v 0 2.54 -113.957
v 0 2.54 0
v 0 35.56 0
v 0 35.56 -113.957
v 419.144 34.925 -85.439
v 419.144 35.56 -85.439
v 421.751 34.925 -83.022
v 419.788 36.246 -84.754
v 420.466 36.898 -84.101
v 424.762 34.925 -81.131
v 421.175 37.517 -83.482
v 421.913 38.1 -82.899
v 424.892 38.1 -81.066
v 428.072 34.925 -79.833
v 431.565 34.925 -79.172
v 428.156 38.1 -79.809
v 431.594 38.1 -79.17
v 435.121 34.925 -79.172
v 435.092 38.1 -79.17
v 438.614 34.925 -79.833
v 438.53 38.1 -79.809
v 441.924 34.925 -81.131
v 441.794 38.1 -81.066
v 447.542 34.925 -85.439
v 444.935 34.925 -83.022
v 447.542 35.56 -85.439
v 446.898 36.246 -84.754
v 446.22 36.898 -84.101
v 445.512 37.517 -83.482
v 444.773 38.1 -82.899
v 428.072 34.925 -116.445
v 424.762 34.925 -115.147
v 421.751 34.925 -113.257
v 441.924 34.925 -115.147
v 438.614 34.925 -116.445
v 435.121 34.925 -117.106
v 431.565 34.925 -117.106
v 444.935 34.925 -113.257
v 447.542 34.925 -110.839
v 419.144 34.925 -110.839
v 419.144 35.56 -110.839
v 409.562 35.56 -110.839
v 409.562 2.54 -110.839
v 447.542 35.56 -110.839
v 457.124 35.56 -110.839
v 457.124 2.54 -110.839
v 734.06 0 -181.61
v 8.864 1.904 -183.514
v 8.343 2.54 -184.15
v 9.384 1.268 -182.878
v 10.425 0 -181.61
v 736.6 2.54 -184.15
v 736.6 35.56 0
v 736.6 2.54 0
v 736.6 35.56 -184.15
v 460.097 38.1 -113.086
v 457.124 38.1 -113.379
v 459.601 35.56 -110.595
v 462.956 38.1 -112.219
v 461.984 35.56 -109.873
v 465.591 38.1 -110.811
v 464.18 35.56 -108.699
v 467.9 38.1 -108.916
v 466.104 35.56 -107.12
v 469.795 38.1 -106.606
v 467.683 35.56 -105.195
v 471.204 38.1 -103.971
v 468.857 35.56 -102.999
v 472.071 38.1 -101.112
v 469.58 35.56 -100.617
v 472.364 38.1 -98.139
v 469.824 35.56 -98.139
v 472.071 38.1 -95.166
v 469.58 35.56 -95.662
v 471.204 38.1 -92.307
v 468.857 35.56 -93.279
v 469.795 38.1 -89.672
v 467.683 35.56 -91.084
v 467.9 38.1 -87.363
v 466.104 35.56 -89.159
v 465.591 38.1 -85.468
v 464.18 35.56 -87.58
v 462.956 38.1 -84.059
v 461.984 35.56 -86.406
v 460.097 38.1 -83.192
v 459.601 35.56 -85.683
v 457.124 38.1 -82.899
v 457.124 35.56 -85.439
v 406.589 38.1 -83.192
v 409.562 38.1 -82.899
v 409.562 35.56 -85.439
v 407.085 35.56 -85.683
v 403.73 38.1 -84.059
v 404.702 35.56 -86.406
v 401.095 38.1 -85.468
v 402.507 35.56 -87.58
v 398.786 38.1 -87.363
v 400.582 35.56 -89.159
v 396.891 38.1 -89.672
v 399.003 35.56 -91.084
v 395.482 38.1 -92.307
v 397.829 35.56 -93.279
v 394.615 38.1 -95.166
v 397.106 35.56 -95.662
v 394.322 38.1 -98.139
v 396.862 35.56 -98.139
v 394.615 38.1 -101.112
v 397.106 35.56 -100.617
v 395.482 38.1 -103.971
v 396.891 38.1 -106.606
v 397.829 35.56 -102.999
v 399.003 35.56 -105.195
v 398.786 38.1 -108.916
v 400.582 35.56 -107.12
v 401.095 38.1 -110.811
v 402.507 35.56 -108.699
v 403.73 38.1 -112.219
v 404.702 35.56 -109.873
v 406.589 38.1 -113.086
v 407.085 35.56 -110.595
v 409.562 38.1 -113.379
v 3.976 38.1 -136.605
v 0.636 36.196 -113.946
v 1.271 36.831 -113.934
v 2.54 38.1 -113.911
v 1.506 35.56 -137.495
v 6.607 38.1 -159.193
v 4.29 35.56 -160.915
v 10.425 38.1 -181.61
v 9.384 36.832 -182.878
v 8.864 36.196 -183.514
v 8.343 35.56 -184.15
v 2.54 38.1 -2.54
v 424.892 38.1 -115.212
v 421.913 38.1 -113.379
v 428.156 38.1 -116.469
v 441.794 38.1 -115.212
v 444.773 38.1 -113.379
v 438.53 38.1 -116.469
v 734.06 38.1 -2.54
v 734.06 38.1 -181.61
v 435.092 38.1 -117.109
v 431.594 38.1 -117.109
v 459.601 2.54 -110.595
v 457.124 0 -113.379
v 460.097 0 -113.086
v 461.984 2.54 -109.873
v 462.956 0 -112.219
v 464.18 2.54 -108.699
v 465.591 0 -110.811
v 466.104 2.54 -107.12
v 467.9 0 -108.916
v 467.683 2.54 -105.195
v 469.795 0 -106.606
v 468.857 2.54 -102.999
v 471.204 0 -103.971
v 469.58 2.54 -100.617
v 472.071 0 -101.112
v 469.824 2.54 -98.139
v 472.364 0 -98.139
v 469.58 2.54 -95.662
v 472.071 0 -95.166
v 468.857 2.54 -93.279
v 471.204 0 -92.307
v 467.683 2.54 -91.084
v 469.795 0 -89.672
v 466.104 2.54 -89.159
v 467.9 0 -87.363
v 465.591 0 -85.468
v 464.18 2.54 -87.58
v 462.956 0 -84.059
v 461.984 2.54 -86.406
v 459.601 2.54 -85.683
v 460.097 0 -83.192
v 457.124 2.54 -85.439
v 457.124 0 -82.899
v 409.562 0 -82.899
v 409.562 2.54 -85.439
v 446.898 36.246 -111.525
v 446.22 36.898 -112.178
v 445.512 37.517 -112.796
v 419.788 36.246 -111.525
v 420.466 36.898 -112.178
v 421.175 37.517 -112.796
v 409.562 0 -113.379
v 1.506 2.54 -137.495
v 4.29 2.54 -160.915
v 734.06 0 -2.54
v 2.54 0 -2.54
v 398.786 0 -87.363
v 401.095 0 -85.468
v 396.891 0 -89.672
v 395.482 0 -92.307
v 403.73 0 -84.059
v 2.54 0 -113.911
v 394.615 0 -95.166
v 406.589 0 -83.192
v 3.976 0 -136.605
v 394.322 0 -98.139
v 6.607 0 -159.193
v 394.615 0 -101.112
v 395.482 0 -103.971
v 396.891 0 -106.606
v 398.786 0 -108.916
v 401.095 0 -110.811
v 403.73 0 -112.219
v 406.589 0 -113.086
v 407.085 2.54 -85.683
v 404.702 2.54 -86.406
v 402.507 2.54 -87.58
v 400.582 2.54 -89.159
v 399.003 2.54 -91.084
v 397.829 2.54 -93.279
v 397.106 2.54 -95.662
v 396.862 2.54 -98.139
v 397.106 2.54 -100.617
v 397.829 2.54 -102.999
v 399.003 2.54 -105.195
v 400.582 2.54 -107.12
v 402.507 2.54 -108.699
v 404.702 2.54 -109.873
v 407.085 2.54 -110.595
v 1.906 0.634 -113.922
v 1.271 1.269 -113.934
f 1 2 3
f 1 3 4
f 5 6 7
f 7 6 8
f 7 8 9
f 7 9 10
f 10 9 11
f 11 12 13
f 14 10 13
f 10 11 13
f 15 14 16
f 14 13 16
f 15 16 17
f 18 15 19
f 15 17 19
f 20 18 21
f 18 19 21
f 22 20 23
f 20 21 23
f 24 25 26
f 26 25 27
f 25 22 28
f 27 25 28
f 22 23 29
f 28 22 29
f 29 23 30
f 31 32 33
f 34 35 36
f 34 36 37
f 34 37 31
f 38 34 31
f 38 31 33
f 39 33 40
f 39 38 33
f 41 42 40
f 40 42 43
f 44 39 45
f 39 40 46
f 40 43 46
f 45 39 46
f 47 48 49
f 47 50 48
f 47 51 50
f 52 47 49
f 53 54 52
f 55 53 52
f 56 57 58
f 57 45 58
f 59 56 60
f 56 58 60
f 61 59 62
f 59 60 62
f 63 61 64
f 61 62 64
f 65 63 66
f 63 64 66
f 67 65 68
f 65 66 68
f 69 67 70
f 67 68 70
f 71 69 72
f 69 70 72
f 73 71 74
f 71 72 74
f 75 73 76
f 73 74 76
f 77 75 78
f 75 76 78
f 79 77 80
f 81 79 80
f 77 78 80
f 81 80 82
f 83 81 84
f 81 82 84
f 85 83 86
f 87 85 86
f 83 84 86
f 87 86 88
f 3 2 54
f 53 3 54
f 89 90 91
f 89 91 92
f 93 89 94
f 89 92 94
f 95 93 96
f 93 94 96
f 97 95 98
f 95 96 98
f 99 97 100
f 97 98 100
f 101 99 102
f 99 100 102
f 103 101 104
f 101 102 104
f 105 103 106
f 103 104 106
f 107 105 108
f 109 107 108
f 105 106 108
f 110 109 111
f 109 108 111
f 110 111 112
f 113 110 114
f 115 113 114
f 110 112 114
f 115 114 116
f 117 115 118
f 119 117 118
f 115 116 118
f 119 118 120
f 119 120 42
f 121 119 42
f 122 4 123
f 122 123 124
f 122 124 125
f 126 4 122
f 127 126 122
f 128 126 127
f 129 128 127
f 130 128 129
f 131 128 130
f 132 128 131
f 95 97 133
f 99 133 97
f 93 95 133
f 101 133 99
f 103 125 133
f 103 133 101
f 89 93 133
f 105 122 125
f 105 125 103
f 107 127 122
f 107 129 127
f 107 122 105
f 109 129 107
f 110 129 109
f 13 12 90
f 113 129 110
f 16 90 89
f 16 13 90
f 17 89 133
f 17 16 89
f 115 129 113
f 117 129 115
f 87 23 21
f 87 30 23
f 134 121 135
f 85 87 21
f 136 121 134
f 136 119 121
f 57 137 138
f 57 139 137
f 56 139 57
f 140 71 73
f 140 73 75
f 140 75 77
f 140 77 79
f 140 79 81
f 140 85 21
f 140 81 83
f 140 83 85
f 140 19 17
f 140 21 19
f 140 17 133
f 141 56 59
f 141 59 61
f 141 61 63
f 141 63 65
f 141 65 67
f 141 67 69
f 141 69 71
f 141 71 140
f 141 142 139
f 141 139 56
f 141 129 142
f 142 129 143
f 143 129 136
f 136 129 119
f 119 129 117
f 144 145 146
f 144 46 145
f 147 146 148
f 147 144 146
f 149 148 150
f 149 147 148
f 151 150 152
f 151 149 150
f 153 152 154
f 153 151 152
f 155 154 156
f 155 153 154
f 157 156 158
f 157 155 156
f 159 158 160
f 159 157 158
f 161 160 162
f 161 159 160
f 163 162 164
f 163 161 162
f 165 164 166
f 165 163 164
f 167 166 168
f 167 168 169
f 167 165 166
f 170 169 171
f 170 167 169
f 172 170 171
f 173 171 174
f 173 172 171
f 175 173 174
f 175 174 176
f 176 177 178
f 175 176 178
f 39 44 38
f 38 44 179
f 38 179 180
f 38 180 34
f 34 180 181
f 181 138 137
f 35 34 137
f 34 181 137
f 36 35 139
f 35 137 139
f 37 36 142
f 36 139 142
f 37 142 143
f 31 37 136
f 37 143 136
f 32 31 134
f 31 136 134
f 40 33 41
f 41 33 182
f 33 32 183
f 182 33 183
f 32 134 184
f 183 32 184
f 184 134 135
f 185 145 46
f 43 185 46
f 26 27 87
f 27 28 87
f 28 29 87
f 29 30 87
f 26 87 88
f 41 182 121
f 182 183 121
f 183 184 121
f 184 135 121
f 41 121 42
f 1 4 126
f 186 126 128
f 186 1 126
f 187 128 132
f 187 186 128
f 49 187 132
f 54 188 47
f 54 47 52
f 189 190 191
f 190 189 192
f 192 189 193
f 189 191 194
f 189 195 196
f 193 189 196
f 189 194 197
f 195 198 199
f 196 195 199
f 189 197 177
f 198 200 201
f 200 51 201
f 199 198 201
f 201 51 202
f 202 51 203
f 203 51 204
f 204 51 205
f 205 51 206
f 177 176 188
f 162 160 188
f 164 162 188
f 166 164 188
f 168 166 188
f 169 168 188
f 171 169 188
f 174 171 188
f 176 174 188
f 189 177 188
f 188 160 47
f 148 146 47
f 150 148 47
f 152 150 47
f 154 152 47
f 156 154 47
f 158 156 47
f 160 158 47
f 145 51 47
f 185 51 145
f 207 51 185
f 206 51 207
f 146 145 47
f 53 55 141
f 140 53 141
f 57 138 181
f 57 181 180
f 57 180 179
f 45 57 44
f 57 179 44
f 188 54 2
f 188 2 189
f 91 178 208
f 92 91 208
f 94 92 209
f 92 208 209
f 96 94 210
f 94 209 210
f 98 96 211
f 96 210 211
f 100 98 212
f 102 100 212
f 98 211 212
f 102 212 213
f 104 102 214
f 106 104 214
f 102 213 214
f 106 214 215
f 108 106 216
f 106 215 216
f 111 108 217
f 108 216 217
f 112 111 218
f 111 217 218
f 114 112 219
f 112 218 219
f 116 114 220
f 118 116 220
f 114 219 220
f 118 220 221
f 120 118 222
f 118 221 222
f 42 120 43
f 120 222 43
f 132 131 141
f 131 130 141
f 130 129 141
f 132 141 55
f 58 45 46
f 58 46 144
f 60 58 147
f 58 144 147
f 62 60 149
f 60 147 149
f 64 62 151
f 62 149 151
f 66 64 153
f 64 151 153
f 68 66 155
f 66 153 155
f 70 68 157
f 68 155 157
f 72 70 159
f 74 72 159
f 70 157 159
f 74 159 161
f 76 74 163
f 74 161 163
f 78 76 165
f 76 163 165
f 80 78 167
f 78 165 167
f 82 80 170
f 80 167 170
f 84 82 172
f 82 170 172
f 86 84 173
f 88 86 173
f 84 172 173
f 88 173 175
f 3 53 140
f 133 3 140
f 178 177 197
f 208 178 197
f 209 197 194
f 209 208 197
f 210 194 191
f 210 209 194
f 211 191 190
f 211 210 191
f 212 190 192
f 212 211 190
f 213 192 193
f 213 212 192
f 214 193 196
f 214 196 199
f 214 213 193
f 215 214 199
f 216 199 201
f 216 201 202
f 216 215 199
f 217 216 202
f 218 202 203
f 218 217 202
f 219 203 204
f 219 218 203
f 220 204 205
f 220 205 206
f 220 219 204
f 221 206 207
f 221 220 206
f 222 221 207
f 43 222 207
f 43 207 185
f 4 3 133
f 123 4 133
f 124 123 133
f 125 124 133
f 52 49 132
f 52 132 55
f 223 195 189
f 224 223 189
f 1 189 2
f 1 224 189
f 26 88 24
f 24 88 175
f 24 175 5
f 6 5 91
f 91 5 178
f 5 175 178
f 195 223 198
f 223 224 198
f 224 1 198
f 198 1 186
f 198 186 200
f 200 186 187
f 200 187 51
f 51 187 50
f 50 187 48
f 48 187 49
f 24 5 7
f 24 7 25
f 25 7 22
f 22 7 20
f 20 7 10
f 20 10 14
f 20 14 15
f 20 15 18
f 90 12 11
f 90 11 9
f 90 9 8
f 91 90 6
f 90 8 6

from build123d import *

# Parameters (mm, degrees)
SKETCH1_W           = 736.6
SKETCH1_H           = 184.15
BOSS_EXTRUDE1_DEPTH = 38.1
CUT_EXTRUDE2_DEPTH  = 761.225224851
CHAMFER1_SIZE       = 2.54
CHAMFER2_SIZE       = 2.54
SKETCH2_R           = 19.05
CUT_EXTRUDE1_DEPTH  = 3.175


with BuildPart() as part:
    # Sketch1 → Boss-Extrude1 (new body)
    with BuildSketch(Plane(origin=(0, 0, 0), x_dir=(1, 0, 0), z_dir=(0, 1, 0))):
        with Locations((368.3, 92.075)):
            Rectangle(SKETCH1_W, SKETCH1_H)
        with BuildLine():
            Line((409.5623, 110.83925), (457.1238, 110.83925))
            ThreePointArc((457.1238, 110.83925), (469.8238, 98.13925), (457.1238, 85.43925))
            Line((457.1238, 85.43925), (409.5623, 85.43925))
            ThreePointArc((409.5623, 85.43925), (396.8623, 98.13925), (409.5623, 110.83925))
        make_face(mode=Mode.SUBTRACT)
    extrude(amount=BOSS_EXTRUDE1_DEPTH)

    # Sketch4 → Cut-Extrude2 (cut, through all)
    with BuildSketch(Plane.XZ):
        with BuildLine():
            Line((0, -184.15), (0, -113.957302712))
            ThreePointArc((0, -113.957302712), (2.738891811, -149.223945145), (8.343201677, -184.15))
            Line((8.343201677, -184.15), (0, -184.15))
        make_face()
    extrude(amount=-CUT_EXTRUDE2_DEPTH, mode=Mode.SUBTRACT)

    # Chamfer1
    # the kernel refuses this chamfer: 2.54 mm, written as the material it takes off along each edge
    with BuildSketch(Plane(origin=(736.6, 38.1, 6.532074789), x_dir=(0.027495876610568244, -0.9996219169112971, 0), z_dir=(0, 0, -1))) as chamfer1_piece_1:
        Polygon((CHAMFER1_SIZE * 0.999621916911, CHAMFER1_SIZE * 0.0274958766106), (-CHAMFER1_SIZE * 0.0274958766106, CHAMFER1_SIZE * 0.999621916911), (0, 0), align=None)
    extrude(amount=197.214149579, mode=Mode.SUBTRACT)
    with BuildSketch(Plane(origin=(457.1238, 38.1, -98.13925), x_dir=(0, 0, -1), z_dir=(-1, 0, 0))) as chamfer1_piece_2:
        Polygon((12.7 + CHAMFER1_SIZE, 0), (12.7, CHAMFER1_SIZE), (12.7, 0), align=None)
    revolve(axis=Axis((457.1238, 38.1, -98.13925), (0, -1, 0)), revolution_arc=180, mode=Mode.SUBTRACT)
    with BuildSketch(Plane(origin=(743.132074789, 38.1, -184.15), x_dir=(0, 0.027495876610587267, 0.9996219169112966), z_dir=(-1, 0, 0))) as chamfer1_piece_3:
        Polygon((CHAMFER1_SIZE * 0.999621916911, -CHAMFER1_SIZE * 0.0274958766106), (-CHAMFER1_SIZE * 0.0274958766106, -CHAMFER1_SIZE * 0.999621916911), (0, 0), align=None)
    extrude(amount=741.320947902, mode=Mode.SUBTRACT)
    with BuildSketch(Plane(origin=(409.5623, 38.1, -110.83925), x_dir=(0, 0.027495876610587267, -0.9996219169112966), z_dir=(1, 0, 0)), Plane(origin=(457.1238, 38.1, -85.43925), x_dir=(0, 0.027495876610587267, 0.9996219169112966), z_dir=(-1, 0, 0))) as chamfer1_piece_4:
        Polygon((CHAMFER1_SIZE * 0.999621916911, -CHAMFER1_SIZE * 0.0274958766106), (-CHAMFER1_SIZE * 0.0274958766106, -CHAMFER1_SIZE * 0.999621916911), (0, 0), align=None)
    extrude(amount=47.5615, mode=Mode.SUBTRACT)
    with BuildSketch(Plane(origin=(409.5623, 38.1, -98.13925), x_dir=(0, 0, 1), z_dir=(1, 0, 0))) as chamfer1_piece_5:
        Polygon((12.7 + CHAMFER1_SIZE, 0), (12.7, CHAMFER1_SIZE), (12.7, 0), align=None)
    revolve(axis=Axis((409.5623, 38.1, -98.13925), (0, -1, 0)), revolution_arc=180, mode=Mode.SUBTRACT)
    with BuildSketch(Plane(origin=(0, 38.1, -120.489377502), x_dir=(-0.02749587661058648, -0.9996219169112968, 0), z_dir=(0, 0, 1))) as chamfer1_piece_6:
        Polygon((CHAMFER1_SIZE * 0.999621916911, CHAMFER1_SIZE * 0.0274958766106), (-CHAMFER1_SIZE * 0.0274958766106, CHAMFER1_SIZE * 0.999621916911), (0, 0), align=None)
    extrude(amount=127.021452291, mode=Mode.SUBTRACT)
    with BuildSketch(Plane(origin=(433.324, 38.1, -98.044), x_dir=(-0.9997657983904642, 0, -0.021641357828885384), z_dir=(-0.021641357828885384, 0, 0.9997657983904642))) as chamfer1_piece_7:
        Polygon((433.6161 - CHAMFER1_SIZE, 0), (433.6161, CHAMFER1_SIZE), (433.6161, 0), align=None)
    revolve(axis=Axis((433.324, 38.1, -98.044), (0, -1, 0)), revolution_arc=11.076796252, mode=Mode.SUBTRACT)
    with BuildSketch(Plane(origin=(-6.532074789, 38.1, 0), x_dir=(0, -0.9996219169112968, 0.027495876610586393), z_dir=(1, 0, 0))) as chamfer1_piece_8:
        Polygon((CHAMFER1_SIZE * 0.999621916911, CHAMFER1_SIZE * 0.0274958766106), (-CHAMFER1_SIZE * 0.0274958766106, CHAMFER1_SIZE * 0.999621916911), (0, 0), align=None)
    extrude(amount=749.664149579, mode=Mode.SUBTRACT)

    # Chamfer2
    # the kernel refuses this chamfer: 2.54 mm, written as the material it takes off along each edge
    with BuildSketch(Plane(origin=(457.1238, 0, -98.13925), x_dir=(0, 0, -1), z_dir=(-1, 0, 0))) as chamfer2_piece_1:
        Polygon((12.7 + CHAMFER2_SIZE, 0), (12.7, -CHAMFER2_SIZE), (12.7, 0), align=None)
    revolve(axis=Axis((457.1238, 0, -98.13925), (0, -1, 0)), revolution_arc=180, mode=Mode.SUBTRACT)
    with BuildSketch(Plane(origin=(409.5623, 0, -110.83925), x_dir=(0, -0.027495876610586324, -0.9996219169112968), z_dir=(1, 0, 0)), Plane(origin=(457.1238, 0, -85.43925), x_dir=(0, -0.027495876610586324, 0.9996219169112968), z_dir=(-1, 0, 0))) as chamfer2_piece_2:
        Polygon((CHAMFER2_SIZE * 0.999621916911, CHAMFER2_SIZE * 0.0274958766106), (-CHAMFER2_SIZE * 0.0274958766106, CHAMFER2_SIZE * 0.999621916911), (0, 0), align=None)
    extrude(amount=47.5615, mode=Mode.SUBTRACT)
    with BuildSketch(Plane(origin=(409.5623, 0, -98.13925), x_dir=(0, 0, 1), z_dir=(1, 0, 0))) as chamfer2_piece_3:
        Polygon((12.7 + CHAMFER2_SIZE, 0), (12.7, -CHAMFER2_SIZE), (12.7, 0), align=None)
    revolve(axis=Axis((409.5623, 0, -98.13925), (0, -1, 0)), revolution_arc=180, mode=Mode.SUBTRACT)
    with BuildSketch(Plane(origin=(0, 0, -120.489377502), x_dir=(0.9996219169112968, -0.02749587661058605, 0), z_dir=(0, 0, 1))) as chamfer2_piece_4:
        Polygon((CHAMFER2_SIZE * 0.999621916911, CHAMFER2_SIZE * 0.0274958766106), (-CHAMFER2_SIZE * 0.0274958766106, CHAMFER2_SIZE * 0.999621916911), (0, 0), align=None)
    extrude(amount=127.021452291, mode=Mode.SUBTRACT)
    with BuildSketch(Plane(origin=(433.324, 0, -98.044), x_dir=(-0.9997657983904642, 0, -0.021641357828885415), z_dir=(-0.021641357828885415, 0, 0.9997657983904642))) as chamfer2_piece_5:
        Polygon((433.6161 - CHAMFER2_SIZE, 0), (433.6161, -CHAMFER2_SIZE), (433.6161, 0), align=None)
    revolve(axis=Axis((433.324, 0, -98.044), (0, -1, 0)), revolution_arc=11.076796252, mode=Mode.SUBTRACT)
    with BuildSketch(Plane(origin=(743.132074789, 0, -184.15), x_dir=(0, -0.027495876610586403, 0.9996219169112968), z_dir=(-1, 0, 0))) as chamfer2_piece_6:
        Polygon((CHAMFER2_SIZE * 0.999621916911, CHAMFER2_SIZE * 0.0274958766106), (-CHAMFER2_SIZE * 0.0274958766106, CHAMFER2_SIZE * 0.999621916911), (0, 0), align=None)
    extrude(amount=741.320947902, mode=Mode.SUBTRACT)
    with BuildSketch(Plane(origin=(736.6, 0, 6.532074789), x_dir=(-0.9996219169112966, -0.027495876610587444, 0), z_dir=(0, 0, -1))) as chamfer2_piece_7:
        Polygon((CHAMFER2_SIZE * 0.999621916911, CHAMFER2_SIZE * 0.0274958766106), (-CHAMFER2_SIZE * 0.0274958766106, CHAMFER2_SIZE * 0.999621916911), (0, 0), align=None)
    extrude(amount=197.214149579, mode=Mode.SUBTRACT)
    with BuildSketch(Plane(origin=(-6.532074789, 0, 0), x_dir=(0, 0.9996219169112968, 0.027495876610586407), z_dir=(1, 0, 0))) as chamfer2_piece_8:
        Polygon((CHAMFER2_SIZE * 0.999621916911, -CHAMFER2_SIZE * 0.0274958766106), (-CHAMFER2_SIZE * 0.0274958766106, -CHAMFER2_SIZE * 0.999621916911), (0, 0), align=None)
    extrude(amount=749.664149579, mode=Mode.SUBTRACT)

    # Sketch2 → Cut-Extrude1 (cut)
    with BuildSketch(Plane(origin=(0, 38.1, 0), x_dir=(1, 0, 0), z_dir=(0, 1, 0))):
        with Locations((433.34305, 98.13925)):
            Circle(SKETCH2_R)
    extrude(amount=-CUT_EXTRUDE1_DEPTH, mode=Mode.SUBTRACT)


solid = part.part
